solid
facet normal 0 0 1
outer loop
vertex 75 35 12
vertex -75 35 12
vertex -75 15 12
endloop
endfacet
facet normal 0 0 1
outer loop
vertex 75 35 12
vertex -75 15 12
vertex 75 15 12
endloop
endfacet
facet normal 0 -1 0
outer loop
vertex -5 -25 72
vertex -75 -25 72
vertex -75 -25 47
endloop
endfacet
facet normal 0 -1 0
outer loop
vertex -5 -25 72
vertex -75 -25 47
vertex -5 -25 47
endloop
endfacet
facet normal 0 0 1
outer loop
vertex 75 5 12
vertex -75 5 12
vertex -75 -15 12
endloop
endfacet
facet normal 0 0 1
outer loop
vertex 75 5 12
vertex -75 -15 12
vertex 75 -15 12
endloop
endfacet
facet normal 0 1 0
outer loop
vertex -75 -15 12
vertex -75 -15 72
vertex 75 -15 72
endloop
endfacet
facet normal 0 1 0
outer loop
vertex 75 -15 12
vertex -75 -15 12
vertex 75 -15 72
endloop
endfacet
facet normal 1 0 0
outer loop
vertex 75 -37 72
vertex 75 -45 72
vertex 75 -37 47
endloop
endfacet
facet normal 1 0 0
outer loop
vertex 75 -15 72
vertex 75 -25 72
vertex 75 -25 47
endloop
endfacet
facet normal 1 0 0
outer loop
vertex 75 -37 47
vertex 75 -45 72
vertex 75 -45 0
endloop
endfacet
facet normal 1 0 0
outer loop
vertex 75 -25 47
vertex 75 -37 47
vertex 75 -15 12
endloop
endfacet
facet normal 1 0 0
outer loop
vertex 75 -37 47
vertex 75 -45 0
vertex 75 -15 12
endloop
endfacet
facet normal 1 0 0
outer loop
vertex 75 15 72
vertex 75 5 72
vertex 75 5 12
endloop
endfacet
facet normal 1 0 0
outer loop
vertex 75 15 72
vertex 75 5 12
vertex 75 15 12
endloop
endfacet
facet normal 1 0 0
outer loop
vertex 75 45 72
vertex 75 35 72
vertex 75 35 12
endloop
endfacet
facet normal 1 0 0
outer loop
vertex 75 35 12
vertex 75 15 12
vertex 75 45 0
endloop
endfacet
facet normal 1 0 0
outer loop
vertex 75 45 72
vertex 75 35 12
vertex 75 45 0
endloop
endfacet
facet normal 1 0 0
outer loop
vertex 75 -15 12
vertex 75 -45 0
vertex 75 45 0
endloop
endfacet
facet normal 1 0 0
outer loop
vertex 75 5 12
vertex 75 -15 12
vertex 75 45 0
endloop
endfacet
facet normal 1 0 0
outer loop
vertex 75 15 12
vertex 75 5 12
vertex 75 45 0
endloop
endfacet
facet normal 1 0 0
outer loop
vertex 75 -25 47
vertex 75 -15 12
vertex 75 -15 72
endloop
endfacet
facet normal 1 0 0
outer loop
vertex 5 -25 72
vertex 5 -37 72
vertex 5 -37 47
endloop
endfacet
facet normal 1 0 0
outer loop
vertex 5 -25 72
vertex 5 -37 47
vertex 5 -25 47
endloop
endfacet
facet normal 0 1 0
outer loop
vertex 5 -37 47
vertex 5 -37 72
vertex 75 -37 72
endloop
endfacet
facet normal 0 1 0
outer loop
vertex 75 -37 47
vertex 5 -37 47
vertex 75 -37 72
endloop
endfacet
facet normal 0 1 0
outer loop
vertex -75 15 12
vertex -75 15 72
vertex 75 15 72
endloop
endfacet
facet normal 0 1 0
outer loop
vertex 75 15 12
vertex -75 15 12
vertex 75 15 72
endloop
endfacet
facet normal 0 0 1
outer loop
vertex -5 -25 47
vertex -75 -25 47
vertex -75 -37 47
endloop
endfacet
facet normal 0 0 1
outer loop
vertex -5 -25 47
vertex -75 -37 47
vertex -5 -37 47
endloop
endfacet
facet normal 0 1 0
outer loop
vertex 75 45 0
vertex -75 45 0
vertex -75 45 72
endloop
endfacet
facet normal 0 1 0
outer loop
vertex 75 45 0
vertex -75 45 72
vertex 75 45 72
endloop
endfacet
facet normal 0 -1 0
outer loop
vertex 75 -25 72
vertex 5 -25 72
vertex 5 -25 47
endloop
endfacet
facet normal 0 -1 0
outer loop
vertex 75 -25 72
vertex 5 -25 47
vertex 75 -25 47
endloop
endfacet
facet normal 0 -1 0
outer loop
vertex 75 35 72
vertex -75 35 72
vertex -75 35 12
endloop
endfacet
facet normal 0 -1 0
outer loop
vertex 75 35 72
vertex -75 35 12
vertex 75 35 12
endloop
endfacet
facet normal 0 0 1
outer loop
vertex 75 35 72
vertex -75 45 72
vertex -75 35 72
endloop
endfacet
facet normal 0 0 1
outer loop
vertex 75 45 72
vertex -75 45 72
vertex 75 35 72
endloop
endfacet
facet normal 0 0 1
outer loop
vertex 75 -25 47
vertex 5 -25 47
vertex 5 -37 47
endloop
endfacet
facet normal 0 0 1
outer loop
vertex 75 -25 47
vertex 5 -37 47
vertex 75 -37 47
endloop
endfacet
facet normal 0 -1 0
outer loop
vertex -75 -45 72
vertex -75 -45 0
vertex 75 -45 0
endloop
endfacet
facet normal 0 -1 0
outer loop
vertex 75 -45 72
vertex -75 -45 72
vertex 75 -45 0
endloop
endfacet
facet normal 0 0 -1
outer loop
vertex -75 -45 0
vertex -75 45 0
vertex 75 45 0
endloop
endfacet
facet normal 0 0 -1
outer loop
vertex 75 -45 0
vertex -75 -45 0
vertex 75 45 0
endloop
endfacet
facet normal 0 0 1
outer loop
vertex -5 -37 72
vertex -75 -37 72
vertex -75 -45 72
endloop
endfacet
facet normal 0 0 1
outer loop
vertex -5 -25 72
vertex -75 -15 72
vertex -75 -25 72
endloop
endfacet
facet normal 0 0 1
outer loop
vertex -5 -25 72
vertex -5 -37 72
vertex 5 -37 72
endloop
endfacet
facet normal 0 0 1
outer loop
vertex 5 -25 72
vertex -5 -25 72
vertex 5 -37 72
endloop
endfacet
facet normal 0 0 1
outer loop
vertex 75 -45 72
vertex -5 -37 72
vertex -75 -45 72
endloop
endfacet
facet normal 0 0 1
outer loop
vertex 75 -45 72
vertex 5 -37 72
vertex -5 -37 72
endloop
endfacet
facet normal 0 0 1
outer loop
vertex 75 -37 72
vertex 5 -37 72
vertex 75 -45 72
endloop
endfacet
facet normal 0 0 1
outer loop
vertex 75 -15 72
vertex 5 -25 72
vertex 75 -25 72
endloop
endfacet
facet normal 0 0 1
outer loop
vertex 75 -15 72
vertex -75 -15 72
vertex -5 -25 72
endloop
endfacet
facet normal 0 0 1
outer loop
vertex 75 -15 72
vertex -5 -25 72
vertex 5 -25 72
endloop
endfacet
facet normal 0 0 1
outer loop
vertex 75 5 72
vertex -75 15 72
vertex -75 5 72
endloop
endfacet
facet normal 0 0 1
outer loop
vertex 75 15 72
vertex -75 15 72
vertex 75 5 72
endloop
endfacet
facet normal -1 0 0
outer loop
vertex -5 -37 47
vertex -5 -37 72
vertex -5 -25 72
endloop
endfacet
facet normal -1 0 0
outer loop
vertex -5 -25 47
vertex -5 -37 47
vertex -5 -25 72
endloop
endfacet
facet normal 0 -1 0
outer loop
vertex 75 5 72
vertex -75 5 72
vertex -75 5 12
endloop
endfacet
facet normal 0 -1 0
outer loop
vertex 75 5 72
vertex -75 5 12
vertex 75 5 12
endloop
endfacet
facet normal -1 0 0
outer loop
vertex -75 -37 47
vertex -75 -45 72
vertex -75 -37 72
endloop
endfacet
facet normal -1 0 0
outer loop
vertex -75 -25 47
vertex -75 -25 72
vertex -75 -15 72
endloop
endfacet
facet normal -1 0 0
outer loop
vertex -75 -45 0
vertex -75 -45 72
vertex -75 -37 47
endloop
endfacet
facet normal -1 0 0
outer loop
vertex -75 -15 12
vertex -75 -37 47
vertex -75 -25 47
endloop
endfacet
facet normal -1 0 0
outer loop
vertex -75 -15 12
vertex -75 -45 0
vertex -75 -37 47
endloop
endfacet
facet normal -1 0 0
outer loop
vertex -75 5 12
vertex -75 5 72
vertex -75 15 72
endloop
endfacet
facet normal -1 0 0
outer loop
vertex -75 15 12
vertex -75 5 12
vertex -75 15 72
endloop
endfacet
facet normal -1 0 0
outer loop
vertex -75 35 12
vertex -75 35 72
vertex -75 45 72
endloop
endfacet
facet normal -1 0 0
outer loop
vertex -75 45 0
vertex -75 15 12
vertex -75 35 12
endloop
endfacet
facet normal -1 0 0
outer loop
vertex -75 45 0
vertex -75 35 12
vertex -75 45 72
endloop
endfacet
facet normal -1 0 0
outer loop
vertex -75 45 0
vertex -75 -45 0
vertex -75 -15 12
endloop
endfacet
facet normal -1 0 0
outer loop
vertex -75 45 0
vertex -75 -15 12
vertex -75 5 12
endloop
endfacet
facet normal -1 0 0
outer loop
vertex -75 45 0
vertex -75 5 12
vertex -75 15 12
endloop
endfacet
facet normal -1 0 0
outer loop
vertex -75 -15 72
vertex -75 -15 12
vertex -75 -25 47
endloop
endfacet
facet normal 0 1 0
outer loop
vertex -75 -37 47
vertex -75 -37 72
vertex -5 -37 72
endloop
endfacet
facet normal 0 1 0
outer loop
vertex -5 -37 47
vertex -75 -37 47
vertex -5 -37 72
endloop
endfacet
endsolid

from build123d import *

# Parameters (mm, degrees)
F0_W     = 150
F0_H     = 90
F1_DEPTH = 72
F2_W     = 70
F2_H     = 12
F3_DEPTH = 25
F4_W     = 150
F4_H     = 20
F5_DEPTH = 60


with BuildPart() as f1:
    # F0 (on Top) → F1 (new body)
    with BuildSketch(Plane.XY):
        Rectangle(F0_W, F0_H)
    extrude(amount=F1_DEPTH)

    # F2 (on face) → F3 (cut)
    with BuildSketch(Plane.XY.offset(72)):
        with Locations((-40, -31)):
            Rectangle(F2_W, F2_H)
        with Locations((40, -31)):
            Rectangle(F2_W, F2_H)
    extrude(amount=-F3_DEPTH, mode=Mode.SUBTRACT)

    # F4 (on face) → F5 (cut)
    with BuildSketch(Plane.XY.offset(72)):
        with Locations((0, 25)):
            Rectangle(F4_W, F4_H)
        with Locations((0, -5)):
            Rectangle(F4_W, F4_H)
    extrude(amount=-F5_DEPTH, mode=Mode.SUBTRACT)


solid = f1.part
